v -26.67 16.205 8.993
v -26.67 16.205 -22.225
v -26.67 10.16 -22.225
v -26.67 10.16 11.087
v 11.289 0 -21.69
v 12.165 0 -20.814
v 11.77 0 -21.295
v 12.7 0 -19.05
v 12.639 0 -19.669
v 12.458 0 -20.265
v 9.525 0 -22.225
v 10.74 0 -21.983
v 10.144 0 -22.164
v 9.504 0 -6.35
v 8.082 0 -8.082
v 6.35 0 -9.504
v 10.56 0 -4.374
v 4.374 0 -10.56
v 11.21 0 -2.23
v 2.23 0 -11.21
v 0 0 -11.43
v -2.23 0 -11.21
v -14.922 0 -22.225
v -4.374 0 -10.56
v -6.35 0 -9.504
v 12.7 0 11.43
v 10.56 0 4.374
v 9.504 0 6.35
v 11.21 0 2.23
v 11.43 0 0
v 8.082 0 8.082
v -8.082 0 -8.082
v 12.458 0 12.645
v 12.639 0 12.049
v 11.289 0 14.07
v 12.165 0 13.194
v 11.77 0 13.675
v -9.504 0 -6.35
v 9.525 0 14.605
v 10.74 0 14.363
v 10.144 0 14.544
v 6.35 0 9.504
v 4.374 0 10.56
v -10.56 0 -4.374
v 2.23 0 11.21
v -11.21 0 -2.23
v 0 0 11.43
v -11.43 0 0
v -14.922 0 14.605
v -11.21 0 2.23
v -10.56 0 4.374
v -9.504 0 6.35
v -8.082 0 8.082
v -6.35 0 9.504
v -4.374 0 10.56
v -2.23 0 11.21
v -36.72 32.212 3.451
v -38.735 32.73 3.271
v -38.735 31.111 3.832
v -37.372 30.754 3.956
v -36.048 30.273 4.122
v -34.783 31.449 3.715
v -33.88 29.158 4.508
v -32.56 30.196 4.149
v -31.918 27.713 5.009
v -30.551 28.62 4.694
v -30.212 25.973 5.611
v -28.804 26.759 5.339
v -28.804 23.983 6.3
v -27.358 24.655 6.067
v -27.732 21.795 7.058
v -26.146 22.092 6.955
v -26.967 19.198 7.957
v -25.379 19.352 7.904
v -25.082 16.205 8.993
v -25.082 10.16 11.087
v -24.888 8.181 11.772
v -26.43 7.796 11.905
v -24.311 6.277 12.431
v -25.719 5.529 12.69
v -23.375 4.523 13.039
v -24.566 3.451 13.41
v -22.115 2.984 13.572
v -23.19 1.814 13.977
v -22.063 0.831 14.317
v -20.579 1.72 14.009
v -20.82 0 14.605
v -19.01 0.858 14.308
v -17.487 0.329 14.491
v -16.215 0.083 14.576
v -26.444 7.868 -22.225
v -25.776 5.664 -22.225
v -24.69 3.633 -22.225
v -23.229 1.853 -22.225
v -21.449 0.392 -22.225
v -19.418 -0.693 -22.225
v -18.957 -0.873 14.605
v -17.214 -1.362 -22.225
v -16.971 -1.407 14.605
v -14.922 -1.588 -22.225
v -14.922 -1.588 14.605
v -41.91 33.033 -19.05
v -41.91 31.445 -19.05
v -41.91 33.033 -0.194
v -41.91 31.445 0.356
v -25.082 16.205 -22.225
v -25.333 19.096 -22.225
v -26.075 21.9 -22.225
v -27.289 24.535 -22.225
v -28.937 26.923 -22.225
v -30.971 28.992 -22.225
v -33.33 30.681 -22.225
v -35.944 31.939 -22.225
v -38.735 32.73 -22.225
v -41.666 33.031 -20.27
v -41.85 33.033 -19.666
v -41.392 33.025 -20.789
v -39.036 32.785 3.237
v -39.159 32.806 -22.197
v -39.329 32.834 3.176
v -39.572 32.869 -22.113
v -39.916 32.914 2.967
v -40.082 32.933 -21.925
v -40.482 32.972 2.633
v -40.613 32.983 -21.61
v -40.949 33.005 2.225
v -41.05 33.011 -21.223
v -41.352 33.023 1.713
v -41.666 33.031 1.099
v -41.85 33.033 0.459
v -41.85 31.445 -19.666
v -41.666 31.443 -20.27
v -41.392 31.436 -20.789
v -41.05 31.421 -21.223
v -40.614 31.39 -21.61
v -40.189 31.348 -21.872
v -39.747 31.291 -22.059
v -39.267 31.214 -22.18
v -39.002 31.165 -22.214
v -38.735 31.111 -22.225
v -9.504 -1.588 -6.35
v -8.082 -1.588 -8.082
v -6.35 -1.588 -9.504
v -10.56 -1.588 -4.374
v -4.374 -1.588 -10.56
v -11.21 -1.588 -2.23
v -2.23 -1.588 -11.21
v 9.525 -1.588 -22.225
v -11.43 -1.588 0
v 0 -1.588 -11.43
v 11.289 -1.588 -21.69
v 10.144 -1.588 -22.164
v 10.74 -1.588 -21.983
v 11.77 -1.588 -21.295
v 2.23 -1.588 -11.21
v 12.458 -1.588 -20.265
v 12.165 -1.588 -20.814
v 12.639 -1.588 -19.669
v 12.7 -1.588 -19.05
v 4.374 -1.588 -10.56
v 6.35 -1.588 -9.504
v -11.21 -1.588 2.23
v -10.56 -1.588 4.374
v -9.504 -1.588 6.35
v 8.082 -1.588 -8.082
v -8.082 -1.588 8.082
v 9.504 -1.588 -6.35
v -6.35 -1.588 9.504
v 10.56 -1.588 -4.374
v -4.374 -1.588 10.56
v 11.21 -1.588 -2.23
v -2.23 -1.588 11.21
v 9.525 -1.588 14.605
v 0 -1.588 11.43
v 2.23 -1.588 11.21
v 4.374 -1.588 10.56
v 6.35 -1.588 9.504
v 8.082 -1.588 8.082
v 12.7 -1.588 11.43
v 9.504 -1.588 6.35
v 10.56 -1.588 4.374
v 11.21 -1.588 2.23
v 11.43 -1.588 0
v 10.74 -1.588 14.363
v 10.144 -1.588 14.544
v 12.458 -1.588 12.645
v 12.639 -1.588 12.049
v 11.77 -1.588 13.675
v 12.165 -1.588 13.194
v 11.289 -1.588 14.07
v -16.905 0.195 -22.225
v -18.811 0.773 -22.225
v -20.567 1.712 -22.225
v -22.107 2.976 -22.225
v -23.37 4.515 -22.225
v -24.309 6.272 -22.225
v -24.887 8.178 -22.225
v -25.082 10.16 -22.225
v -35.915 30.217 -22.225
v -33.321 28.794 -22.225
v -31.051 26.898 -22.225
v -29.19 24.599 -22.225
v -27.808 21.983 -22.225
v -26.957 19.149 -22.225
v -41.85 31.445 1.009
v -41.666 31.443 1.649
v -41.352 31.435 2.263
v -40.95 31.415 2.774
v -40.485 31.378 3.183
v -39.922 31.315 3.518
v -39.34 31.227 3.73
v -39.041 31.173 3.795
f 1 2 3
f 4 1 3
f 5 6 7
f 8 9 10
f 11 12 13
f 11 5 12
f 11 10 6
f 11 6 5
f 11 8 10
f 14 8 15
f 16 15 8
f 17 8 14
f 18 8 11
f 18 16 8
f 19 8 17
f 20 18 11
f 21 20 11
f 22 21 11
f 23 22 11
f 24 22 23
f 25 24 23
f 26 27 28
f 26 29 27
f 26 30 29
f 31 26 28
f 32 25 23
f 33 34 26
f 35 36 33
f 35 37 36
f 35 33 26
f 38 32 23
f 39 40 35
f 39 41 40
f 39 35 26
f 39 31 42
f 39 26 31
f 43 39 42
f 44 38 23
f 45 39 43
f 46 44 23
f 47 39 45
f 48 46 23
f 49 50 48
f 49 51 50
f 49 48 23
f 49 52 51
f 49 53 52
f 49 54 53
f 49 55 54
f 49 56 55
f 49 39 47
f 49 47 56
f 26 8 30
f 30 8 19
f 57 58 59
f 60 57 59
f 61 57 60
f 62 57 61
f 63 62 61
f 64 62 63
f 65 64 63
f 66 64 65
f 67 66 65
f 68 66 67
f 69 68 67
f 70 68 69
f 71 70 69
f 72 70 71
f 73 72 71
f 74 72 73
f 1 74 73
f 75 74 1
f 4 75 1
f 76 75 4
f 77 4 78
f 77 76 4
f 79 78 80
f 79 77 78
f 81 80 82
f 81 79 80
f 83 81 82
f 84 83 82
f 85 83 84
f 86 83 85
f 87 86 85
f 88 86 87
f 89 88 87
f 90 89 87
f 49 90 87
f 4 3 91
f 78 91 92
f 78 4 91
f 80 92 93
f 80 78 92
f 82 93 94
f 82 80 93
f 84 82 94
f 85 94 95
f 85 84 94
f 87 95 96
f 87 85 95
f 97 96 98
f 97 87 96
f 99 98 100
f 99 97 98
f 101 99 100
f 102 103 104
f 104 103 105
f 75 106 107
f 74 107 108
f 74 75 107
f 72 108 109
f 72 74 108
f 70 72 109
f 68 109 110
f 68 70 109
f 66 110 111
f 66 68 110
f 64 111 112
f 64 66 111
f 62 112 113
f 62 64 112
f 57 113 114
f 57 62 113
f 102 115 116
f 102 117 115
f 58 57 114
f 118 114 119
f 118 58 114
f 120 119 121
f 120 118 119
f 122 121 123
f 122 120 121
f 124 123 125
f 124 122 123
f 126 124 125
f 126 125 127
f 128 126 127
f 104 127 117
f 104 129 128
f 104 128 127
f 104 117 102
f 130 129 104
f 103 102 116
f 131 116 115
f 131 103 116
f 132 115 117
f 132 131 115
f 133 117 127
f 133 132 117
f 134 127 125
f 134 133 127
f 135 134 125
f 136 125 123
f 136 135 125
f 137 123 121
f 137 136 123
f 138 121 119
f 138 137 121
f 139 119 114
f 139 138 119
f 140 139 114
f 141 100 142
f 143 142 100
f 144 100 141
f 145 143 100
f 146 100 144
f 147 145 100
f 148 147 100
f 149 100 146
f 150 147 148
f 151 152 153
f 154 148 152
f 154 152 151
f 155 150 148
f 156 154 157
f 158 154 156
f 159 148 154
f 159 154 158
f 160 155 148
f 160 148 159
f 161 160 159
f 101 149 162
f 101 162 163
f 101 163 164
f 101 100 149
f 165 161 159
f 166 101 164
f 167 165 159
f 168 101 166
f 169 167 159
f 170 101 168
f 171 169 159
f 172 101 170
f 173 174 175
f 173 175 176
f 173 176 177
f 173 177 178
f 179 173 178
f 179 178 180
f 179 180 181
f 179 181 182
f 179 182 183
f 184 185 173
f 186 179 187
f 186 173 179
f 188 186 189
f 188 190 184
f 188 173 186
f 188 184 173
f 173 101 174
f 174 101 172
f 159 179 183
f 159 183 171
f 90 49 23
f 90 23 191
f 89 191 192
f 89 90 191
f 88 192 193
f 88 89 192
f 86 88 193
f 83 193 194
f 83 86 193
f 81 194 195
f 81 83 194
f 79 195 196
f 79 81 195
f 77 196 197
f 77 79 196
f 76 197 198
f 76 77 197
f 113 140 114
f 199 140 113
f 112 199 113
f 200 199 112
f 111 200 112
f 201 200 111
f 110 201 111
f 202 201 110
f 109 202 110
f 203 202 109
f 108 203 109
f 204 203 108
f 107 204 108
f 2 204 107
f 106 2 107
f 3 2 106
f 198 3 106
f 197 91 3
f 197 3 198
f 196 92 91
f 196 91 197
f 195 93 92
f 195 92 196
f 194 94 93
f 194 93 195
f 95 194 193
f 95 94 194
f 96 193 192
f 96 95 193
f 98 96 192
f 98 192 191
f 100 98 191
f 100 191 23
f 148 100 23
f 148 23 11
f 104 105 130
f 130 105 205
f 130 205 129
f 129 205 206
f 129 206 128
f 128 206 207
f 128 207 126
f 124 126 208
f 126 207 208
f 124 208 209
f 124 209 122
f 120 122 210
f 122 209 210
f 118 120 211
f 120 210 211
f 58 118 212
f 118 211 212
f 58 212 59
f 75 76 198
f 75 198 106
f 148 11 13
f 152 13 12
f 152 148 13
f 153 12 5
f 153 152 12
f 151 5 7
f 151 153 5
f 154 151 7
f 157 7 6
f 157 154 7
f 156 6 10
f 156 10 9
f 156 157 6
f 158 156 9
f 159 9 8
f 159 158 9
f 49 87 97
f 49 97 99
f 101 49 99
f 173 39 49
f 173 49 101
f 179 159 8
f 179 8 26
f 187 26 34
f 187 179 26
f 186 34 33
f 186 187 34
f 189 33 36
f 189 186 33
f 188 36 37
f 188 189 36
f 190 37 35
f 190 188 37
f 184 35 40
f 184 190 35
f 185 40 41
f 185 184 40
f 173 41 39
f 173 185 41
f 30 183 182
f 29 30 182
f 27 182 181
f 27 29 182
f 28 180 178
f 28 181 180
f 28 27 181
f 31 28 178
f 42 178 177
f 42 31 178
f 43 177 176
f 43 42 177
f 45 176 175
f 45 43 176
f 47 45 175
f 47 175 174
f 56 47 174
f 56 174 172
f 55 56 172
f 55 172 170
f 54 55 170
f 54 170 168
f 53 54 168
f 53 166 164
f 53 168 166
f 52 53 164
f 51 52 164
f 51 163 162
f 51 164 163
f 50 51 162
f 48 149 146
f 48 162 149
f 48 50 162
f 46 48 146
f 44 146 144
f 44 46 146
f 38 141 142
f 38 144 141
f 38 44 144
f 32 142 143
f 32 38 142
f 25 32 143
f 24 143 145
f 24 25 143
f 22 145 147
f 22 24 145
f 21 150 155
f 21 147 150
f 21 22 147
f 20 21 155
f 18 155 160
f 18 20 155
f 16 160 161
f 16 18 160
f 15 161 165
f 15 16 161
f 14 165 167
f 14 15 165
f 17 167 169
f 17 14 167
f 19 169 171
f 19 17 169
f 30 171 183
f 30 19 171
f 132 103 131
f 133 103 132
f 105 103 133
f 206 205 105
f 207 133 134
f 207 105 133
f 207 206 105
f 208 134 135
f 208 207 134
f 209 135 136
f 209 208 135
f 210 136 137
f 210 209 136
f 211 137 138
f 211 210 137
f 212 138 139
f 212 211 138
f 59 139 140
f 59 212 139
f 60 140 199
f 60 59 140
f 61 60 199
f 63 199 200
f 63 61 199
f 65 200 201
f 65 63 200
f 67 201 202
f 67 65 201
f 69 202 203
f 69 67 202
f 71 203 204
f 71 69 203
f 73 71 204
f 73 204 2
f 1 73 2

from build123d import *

# Parameters (mm, degrees)
F0_W     = 54.61
F0_H     = 76.2
F0_R     = 11.43
F1_DEPTH = 76.2
F3_DEPTH = 88.9
F5_DEPTH = 101.6
F6_R     = 3.175


with BuildPart() as f1:
    # F0 (on Front) → F1 (new body, symmetric)
    with BuildSketch(Plane.XZ):
        with Locations((-14.605, 15.875)):
            Rectangle(F0_W, F0_H)
        Circle(F0_R, mode=Mode.SUBTRACT)
    extrude(amount=F1_DEPTH, both=True)

    # F2 (on Top) → F3 (intersect, symmetric)
    with BuildSketch(Plane.XY):
        with BuildLine():
            Line((12.7, 0), (-14.9225, 0))
            ThreePointArc((-14.9225, 0), (-22.1067048969, 2.9757951031), (-25.0825, 10.16))
            Line((-25.0825, 10.16), (-25.0825, 16.2052))
            ThreePointArc((-25.0825, 16.2052), (-30.0111606396, 28.1040393604), (-41.91, 33.0327))
            Line((-41.91, 33.0327), (-67.31, 33.0327))
            Line((-67.31, 33.0327), (-67.31, 31.4452))
            Line((-67.31, 31.4452), (-41.91, 31.4452))
            ThreePointArc((-41.91, 31.4452), (-31.1336926547, 26.9815073453), (-26.67, 16.2052))
            Line((-26.67, 16.2052), (-26.67, 10.16))
            ThreePointArc((-26.67, 10.16), (-23.229236912, 1.853263088), (-14.9225, -1.5875))
            Line((-14.9225, -1.5875), (12.7, -1.5875))
            Line((12.7, -1.5875), (12.7, 0))
        make_face()
    extrude(amount=F3_DEPTH, both=True, mode=Mode.INTERSECT)

    # F4 (on Right) → F5 (intersect, symmetric)
    with BuildSketch(Plane.YZ):
        Polygon((33.0327, 3.1664020477), (0, 14.605), (-1.5875, 14.605), (-1.5875, -22.225), (33.0327, -22.225), align=None)
    extrude(amount=F5_DEPTH, both=True, mode=Mode.INTERSECT)

    # F6
    f6_edges = [f1.edges().sort_by_distance(p)[0] for p in [
        (12.7, -0.79375, 14.605),
        (12.7, -0.79375, -22.225),
        (-41.91, 32.23895, 3.441263),
        (-41.91, 32.23895, -22.225),
    ]]
    fillet(f6_edges, radius=F6_R)


solid = f1.part
